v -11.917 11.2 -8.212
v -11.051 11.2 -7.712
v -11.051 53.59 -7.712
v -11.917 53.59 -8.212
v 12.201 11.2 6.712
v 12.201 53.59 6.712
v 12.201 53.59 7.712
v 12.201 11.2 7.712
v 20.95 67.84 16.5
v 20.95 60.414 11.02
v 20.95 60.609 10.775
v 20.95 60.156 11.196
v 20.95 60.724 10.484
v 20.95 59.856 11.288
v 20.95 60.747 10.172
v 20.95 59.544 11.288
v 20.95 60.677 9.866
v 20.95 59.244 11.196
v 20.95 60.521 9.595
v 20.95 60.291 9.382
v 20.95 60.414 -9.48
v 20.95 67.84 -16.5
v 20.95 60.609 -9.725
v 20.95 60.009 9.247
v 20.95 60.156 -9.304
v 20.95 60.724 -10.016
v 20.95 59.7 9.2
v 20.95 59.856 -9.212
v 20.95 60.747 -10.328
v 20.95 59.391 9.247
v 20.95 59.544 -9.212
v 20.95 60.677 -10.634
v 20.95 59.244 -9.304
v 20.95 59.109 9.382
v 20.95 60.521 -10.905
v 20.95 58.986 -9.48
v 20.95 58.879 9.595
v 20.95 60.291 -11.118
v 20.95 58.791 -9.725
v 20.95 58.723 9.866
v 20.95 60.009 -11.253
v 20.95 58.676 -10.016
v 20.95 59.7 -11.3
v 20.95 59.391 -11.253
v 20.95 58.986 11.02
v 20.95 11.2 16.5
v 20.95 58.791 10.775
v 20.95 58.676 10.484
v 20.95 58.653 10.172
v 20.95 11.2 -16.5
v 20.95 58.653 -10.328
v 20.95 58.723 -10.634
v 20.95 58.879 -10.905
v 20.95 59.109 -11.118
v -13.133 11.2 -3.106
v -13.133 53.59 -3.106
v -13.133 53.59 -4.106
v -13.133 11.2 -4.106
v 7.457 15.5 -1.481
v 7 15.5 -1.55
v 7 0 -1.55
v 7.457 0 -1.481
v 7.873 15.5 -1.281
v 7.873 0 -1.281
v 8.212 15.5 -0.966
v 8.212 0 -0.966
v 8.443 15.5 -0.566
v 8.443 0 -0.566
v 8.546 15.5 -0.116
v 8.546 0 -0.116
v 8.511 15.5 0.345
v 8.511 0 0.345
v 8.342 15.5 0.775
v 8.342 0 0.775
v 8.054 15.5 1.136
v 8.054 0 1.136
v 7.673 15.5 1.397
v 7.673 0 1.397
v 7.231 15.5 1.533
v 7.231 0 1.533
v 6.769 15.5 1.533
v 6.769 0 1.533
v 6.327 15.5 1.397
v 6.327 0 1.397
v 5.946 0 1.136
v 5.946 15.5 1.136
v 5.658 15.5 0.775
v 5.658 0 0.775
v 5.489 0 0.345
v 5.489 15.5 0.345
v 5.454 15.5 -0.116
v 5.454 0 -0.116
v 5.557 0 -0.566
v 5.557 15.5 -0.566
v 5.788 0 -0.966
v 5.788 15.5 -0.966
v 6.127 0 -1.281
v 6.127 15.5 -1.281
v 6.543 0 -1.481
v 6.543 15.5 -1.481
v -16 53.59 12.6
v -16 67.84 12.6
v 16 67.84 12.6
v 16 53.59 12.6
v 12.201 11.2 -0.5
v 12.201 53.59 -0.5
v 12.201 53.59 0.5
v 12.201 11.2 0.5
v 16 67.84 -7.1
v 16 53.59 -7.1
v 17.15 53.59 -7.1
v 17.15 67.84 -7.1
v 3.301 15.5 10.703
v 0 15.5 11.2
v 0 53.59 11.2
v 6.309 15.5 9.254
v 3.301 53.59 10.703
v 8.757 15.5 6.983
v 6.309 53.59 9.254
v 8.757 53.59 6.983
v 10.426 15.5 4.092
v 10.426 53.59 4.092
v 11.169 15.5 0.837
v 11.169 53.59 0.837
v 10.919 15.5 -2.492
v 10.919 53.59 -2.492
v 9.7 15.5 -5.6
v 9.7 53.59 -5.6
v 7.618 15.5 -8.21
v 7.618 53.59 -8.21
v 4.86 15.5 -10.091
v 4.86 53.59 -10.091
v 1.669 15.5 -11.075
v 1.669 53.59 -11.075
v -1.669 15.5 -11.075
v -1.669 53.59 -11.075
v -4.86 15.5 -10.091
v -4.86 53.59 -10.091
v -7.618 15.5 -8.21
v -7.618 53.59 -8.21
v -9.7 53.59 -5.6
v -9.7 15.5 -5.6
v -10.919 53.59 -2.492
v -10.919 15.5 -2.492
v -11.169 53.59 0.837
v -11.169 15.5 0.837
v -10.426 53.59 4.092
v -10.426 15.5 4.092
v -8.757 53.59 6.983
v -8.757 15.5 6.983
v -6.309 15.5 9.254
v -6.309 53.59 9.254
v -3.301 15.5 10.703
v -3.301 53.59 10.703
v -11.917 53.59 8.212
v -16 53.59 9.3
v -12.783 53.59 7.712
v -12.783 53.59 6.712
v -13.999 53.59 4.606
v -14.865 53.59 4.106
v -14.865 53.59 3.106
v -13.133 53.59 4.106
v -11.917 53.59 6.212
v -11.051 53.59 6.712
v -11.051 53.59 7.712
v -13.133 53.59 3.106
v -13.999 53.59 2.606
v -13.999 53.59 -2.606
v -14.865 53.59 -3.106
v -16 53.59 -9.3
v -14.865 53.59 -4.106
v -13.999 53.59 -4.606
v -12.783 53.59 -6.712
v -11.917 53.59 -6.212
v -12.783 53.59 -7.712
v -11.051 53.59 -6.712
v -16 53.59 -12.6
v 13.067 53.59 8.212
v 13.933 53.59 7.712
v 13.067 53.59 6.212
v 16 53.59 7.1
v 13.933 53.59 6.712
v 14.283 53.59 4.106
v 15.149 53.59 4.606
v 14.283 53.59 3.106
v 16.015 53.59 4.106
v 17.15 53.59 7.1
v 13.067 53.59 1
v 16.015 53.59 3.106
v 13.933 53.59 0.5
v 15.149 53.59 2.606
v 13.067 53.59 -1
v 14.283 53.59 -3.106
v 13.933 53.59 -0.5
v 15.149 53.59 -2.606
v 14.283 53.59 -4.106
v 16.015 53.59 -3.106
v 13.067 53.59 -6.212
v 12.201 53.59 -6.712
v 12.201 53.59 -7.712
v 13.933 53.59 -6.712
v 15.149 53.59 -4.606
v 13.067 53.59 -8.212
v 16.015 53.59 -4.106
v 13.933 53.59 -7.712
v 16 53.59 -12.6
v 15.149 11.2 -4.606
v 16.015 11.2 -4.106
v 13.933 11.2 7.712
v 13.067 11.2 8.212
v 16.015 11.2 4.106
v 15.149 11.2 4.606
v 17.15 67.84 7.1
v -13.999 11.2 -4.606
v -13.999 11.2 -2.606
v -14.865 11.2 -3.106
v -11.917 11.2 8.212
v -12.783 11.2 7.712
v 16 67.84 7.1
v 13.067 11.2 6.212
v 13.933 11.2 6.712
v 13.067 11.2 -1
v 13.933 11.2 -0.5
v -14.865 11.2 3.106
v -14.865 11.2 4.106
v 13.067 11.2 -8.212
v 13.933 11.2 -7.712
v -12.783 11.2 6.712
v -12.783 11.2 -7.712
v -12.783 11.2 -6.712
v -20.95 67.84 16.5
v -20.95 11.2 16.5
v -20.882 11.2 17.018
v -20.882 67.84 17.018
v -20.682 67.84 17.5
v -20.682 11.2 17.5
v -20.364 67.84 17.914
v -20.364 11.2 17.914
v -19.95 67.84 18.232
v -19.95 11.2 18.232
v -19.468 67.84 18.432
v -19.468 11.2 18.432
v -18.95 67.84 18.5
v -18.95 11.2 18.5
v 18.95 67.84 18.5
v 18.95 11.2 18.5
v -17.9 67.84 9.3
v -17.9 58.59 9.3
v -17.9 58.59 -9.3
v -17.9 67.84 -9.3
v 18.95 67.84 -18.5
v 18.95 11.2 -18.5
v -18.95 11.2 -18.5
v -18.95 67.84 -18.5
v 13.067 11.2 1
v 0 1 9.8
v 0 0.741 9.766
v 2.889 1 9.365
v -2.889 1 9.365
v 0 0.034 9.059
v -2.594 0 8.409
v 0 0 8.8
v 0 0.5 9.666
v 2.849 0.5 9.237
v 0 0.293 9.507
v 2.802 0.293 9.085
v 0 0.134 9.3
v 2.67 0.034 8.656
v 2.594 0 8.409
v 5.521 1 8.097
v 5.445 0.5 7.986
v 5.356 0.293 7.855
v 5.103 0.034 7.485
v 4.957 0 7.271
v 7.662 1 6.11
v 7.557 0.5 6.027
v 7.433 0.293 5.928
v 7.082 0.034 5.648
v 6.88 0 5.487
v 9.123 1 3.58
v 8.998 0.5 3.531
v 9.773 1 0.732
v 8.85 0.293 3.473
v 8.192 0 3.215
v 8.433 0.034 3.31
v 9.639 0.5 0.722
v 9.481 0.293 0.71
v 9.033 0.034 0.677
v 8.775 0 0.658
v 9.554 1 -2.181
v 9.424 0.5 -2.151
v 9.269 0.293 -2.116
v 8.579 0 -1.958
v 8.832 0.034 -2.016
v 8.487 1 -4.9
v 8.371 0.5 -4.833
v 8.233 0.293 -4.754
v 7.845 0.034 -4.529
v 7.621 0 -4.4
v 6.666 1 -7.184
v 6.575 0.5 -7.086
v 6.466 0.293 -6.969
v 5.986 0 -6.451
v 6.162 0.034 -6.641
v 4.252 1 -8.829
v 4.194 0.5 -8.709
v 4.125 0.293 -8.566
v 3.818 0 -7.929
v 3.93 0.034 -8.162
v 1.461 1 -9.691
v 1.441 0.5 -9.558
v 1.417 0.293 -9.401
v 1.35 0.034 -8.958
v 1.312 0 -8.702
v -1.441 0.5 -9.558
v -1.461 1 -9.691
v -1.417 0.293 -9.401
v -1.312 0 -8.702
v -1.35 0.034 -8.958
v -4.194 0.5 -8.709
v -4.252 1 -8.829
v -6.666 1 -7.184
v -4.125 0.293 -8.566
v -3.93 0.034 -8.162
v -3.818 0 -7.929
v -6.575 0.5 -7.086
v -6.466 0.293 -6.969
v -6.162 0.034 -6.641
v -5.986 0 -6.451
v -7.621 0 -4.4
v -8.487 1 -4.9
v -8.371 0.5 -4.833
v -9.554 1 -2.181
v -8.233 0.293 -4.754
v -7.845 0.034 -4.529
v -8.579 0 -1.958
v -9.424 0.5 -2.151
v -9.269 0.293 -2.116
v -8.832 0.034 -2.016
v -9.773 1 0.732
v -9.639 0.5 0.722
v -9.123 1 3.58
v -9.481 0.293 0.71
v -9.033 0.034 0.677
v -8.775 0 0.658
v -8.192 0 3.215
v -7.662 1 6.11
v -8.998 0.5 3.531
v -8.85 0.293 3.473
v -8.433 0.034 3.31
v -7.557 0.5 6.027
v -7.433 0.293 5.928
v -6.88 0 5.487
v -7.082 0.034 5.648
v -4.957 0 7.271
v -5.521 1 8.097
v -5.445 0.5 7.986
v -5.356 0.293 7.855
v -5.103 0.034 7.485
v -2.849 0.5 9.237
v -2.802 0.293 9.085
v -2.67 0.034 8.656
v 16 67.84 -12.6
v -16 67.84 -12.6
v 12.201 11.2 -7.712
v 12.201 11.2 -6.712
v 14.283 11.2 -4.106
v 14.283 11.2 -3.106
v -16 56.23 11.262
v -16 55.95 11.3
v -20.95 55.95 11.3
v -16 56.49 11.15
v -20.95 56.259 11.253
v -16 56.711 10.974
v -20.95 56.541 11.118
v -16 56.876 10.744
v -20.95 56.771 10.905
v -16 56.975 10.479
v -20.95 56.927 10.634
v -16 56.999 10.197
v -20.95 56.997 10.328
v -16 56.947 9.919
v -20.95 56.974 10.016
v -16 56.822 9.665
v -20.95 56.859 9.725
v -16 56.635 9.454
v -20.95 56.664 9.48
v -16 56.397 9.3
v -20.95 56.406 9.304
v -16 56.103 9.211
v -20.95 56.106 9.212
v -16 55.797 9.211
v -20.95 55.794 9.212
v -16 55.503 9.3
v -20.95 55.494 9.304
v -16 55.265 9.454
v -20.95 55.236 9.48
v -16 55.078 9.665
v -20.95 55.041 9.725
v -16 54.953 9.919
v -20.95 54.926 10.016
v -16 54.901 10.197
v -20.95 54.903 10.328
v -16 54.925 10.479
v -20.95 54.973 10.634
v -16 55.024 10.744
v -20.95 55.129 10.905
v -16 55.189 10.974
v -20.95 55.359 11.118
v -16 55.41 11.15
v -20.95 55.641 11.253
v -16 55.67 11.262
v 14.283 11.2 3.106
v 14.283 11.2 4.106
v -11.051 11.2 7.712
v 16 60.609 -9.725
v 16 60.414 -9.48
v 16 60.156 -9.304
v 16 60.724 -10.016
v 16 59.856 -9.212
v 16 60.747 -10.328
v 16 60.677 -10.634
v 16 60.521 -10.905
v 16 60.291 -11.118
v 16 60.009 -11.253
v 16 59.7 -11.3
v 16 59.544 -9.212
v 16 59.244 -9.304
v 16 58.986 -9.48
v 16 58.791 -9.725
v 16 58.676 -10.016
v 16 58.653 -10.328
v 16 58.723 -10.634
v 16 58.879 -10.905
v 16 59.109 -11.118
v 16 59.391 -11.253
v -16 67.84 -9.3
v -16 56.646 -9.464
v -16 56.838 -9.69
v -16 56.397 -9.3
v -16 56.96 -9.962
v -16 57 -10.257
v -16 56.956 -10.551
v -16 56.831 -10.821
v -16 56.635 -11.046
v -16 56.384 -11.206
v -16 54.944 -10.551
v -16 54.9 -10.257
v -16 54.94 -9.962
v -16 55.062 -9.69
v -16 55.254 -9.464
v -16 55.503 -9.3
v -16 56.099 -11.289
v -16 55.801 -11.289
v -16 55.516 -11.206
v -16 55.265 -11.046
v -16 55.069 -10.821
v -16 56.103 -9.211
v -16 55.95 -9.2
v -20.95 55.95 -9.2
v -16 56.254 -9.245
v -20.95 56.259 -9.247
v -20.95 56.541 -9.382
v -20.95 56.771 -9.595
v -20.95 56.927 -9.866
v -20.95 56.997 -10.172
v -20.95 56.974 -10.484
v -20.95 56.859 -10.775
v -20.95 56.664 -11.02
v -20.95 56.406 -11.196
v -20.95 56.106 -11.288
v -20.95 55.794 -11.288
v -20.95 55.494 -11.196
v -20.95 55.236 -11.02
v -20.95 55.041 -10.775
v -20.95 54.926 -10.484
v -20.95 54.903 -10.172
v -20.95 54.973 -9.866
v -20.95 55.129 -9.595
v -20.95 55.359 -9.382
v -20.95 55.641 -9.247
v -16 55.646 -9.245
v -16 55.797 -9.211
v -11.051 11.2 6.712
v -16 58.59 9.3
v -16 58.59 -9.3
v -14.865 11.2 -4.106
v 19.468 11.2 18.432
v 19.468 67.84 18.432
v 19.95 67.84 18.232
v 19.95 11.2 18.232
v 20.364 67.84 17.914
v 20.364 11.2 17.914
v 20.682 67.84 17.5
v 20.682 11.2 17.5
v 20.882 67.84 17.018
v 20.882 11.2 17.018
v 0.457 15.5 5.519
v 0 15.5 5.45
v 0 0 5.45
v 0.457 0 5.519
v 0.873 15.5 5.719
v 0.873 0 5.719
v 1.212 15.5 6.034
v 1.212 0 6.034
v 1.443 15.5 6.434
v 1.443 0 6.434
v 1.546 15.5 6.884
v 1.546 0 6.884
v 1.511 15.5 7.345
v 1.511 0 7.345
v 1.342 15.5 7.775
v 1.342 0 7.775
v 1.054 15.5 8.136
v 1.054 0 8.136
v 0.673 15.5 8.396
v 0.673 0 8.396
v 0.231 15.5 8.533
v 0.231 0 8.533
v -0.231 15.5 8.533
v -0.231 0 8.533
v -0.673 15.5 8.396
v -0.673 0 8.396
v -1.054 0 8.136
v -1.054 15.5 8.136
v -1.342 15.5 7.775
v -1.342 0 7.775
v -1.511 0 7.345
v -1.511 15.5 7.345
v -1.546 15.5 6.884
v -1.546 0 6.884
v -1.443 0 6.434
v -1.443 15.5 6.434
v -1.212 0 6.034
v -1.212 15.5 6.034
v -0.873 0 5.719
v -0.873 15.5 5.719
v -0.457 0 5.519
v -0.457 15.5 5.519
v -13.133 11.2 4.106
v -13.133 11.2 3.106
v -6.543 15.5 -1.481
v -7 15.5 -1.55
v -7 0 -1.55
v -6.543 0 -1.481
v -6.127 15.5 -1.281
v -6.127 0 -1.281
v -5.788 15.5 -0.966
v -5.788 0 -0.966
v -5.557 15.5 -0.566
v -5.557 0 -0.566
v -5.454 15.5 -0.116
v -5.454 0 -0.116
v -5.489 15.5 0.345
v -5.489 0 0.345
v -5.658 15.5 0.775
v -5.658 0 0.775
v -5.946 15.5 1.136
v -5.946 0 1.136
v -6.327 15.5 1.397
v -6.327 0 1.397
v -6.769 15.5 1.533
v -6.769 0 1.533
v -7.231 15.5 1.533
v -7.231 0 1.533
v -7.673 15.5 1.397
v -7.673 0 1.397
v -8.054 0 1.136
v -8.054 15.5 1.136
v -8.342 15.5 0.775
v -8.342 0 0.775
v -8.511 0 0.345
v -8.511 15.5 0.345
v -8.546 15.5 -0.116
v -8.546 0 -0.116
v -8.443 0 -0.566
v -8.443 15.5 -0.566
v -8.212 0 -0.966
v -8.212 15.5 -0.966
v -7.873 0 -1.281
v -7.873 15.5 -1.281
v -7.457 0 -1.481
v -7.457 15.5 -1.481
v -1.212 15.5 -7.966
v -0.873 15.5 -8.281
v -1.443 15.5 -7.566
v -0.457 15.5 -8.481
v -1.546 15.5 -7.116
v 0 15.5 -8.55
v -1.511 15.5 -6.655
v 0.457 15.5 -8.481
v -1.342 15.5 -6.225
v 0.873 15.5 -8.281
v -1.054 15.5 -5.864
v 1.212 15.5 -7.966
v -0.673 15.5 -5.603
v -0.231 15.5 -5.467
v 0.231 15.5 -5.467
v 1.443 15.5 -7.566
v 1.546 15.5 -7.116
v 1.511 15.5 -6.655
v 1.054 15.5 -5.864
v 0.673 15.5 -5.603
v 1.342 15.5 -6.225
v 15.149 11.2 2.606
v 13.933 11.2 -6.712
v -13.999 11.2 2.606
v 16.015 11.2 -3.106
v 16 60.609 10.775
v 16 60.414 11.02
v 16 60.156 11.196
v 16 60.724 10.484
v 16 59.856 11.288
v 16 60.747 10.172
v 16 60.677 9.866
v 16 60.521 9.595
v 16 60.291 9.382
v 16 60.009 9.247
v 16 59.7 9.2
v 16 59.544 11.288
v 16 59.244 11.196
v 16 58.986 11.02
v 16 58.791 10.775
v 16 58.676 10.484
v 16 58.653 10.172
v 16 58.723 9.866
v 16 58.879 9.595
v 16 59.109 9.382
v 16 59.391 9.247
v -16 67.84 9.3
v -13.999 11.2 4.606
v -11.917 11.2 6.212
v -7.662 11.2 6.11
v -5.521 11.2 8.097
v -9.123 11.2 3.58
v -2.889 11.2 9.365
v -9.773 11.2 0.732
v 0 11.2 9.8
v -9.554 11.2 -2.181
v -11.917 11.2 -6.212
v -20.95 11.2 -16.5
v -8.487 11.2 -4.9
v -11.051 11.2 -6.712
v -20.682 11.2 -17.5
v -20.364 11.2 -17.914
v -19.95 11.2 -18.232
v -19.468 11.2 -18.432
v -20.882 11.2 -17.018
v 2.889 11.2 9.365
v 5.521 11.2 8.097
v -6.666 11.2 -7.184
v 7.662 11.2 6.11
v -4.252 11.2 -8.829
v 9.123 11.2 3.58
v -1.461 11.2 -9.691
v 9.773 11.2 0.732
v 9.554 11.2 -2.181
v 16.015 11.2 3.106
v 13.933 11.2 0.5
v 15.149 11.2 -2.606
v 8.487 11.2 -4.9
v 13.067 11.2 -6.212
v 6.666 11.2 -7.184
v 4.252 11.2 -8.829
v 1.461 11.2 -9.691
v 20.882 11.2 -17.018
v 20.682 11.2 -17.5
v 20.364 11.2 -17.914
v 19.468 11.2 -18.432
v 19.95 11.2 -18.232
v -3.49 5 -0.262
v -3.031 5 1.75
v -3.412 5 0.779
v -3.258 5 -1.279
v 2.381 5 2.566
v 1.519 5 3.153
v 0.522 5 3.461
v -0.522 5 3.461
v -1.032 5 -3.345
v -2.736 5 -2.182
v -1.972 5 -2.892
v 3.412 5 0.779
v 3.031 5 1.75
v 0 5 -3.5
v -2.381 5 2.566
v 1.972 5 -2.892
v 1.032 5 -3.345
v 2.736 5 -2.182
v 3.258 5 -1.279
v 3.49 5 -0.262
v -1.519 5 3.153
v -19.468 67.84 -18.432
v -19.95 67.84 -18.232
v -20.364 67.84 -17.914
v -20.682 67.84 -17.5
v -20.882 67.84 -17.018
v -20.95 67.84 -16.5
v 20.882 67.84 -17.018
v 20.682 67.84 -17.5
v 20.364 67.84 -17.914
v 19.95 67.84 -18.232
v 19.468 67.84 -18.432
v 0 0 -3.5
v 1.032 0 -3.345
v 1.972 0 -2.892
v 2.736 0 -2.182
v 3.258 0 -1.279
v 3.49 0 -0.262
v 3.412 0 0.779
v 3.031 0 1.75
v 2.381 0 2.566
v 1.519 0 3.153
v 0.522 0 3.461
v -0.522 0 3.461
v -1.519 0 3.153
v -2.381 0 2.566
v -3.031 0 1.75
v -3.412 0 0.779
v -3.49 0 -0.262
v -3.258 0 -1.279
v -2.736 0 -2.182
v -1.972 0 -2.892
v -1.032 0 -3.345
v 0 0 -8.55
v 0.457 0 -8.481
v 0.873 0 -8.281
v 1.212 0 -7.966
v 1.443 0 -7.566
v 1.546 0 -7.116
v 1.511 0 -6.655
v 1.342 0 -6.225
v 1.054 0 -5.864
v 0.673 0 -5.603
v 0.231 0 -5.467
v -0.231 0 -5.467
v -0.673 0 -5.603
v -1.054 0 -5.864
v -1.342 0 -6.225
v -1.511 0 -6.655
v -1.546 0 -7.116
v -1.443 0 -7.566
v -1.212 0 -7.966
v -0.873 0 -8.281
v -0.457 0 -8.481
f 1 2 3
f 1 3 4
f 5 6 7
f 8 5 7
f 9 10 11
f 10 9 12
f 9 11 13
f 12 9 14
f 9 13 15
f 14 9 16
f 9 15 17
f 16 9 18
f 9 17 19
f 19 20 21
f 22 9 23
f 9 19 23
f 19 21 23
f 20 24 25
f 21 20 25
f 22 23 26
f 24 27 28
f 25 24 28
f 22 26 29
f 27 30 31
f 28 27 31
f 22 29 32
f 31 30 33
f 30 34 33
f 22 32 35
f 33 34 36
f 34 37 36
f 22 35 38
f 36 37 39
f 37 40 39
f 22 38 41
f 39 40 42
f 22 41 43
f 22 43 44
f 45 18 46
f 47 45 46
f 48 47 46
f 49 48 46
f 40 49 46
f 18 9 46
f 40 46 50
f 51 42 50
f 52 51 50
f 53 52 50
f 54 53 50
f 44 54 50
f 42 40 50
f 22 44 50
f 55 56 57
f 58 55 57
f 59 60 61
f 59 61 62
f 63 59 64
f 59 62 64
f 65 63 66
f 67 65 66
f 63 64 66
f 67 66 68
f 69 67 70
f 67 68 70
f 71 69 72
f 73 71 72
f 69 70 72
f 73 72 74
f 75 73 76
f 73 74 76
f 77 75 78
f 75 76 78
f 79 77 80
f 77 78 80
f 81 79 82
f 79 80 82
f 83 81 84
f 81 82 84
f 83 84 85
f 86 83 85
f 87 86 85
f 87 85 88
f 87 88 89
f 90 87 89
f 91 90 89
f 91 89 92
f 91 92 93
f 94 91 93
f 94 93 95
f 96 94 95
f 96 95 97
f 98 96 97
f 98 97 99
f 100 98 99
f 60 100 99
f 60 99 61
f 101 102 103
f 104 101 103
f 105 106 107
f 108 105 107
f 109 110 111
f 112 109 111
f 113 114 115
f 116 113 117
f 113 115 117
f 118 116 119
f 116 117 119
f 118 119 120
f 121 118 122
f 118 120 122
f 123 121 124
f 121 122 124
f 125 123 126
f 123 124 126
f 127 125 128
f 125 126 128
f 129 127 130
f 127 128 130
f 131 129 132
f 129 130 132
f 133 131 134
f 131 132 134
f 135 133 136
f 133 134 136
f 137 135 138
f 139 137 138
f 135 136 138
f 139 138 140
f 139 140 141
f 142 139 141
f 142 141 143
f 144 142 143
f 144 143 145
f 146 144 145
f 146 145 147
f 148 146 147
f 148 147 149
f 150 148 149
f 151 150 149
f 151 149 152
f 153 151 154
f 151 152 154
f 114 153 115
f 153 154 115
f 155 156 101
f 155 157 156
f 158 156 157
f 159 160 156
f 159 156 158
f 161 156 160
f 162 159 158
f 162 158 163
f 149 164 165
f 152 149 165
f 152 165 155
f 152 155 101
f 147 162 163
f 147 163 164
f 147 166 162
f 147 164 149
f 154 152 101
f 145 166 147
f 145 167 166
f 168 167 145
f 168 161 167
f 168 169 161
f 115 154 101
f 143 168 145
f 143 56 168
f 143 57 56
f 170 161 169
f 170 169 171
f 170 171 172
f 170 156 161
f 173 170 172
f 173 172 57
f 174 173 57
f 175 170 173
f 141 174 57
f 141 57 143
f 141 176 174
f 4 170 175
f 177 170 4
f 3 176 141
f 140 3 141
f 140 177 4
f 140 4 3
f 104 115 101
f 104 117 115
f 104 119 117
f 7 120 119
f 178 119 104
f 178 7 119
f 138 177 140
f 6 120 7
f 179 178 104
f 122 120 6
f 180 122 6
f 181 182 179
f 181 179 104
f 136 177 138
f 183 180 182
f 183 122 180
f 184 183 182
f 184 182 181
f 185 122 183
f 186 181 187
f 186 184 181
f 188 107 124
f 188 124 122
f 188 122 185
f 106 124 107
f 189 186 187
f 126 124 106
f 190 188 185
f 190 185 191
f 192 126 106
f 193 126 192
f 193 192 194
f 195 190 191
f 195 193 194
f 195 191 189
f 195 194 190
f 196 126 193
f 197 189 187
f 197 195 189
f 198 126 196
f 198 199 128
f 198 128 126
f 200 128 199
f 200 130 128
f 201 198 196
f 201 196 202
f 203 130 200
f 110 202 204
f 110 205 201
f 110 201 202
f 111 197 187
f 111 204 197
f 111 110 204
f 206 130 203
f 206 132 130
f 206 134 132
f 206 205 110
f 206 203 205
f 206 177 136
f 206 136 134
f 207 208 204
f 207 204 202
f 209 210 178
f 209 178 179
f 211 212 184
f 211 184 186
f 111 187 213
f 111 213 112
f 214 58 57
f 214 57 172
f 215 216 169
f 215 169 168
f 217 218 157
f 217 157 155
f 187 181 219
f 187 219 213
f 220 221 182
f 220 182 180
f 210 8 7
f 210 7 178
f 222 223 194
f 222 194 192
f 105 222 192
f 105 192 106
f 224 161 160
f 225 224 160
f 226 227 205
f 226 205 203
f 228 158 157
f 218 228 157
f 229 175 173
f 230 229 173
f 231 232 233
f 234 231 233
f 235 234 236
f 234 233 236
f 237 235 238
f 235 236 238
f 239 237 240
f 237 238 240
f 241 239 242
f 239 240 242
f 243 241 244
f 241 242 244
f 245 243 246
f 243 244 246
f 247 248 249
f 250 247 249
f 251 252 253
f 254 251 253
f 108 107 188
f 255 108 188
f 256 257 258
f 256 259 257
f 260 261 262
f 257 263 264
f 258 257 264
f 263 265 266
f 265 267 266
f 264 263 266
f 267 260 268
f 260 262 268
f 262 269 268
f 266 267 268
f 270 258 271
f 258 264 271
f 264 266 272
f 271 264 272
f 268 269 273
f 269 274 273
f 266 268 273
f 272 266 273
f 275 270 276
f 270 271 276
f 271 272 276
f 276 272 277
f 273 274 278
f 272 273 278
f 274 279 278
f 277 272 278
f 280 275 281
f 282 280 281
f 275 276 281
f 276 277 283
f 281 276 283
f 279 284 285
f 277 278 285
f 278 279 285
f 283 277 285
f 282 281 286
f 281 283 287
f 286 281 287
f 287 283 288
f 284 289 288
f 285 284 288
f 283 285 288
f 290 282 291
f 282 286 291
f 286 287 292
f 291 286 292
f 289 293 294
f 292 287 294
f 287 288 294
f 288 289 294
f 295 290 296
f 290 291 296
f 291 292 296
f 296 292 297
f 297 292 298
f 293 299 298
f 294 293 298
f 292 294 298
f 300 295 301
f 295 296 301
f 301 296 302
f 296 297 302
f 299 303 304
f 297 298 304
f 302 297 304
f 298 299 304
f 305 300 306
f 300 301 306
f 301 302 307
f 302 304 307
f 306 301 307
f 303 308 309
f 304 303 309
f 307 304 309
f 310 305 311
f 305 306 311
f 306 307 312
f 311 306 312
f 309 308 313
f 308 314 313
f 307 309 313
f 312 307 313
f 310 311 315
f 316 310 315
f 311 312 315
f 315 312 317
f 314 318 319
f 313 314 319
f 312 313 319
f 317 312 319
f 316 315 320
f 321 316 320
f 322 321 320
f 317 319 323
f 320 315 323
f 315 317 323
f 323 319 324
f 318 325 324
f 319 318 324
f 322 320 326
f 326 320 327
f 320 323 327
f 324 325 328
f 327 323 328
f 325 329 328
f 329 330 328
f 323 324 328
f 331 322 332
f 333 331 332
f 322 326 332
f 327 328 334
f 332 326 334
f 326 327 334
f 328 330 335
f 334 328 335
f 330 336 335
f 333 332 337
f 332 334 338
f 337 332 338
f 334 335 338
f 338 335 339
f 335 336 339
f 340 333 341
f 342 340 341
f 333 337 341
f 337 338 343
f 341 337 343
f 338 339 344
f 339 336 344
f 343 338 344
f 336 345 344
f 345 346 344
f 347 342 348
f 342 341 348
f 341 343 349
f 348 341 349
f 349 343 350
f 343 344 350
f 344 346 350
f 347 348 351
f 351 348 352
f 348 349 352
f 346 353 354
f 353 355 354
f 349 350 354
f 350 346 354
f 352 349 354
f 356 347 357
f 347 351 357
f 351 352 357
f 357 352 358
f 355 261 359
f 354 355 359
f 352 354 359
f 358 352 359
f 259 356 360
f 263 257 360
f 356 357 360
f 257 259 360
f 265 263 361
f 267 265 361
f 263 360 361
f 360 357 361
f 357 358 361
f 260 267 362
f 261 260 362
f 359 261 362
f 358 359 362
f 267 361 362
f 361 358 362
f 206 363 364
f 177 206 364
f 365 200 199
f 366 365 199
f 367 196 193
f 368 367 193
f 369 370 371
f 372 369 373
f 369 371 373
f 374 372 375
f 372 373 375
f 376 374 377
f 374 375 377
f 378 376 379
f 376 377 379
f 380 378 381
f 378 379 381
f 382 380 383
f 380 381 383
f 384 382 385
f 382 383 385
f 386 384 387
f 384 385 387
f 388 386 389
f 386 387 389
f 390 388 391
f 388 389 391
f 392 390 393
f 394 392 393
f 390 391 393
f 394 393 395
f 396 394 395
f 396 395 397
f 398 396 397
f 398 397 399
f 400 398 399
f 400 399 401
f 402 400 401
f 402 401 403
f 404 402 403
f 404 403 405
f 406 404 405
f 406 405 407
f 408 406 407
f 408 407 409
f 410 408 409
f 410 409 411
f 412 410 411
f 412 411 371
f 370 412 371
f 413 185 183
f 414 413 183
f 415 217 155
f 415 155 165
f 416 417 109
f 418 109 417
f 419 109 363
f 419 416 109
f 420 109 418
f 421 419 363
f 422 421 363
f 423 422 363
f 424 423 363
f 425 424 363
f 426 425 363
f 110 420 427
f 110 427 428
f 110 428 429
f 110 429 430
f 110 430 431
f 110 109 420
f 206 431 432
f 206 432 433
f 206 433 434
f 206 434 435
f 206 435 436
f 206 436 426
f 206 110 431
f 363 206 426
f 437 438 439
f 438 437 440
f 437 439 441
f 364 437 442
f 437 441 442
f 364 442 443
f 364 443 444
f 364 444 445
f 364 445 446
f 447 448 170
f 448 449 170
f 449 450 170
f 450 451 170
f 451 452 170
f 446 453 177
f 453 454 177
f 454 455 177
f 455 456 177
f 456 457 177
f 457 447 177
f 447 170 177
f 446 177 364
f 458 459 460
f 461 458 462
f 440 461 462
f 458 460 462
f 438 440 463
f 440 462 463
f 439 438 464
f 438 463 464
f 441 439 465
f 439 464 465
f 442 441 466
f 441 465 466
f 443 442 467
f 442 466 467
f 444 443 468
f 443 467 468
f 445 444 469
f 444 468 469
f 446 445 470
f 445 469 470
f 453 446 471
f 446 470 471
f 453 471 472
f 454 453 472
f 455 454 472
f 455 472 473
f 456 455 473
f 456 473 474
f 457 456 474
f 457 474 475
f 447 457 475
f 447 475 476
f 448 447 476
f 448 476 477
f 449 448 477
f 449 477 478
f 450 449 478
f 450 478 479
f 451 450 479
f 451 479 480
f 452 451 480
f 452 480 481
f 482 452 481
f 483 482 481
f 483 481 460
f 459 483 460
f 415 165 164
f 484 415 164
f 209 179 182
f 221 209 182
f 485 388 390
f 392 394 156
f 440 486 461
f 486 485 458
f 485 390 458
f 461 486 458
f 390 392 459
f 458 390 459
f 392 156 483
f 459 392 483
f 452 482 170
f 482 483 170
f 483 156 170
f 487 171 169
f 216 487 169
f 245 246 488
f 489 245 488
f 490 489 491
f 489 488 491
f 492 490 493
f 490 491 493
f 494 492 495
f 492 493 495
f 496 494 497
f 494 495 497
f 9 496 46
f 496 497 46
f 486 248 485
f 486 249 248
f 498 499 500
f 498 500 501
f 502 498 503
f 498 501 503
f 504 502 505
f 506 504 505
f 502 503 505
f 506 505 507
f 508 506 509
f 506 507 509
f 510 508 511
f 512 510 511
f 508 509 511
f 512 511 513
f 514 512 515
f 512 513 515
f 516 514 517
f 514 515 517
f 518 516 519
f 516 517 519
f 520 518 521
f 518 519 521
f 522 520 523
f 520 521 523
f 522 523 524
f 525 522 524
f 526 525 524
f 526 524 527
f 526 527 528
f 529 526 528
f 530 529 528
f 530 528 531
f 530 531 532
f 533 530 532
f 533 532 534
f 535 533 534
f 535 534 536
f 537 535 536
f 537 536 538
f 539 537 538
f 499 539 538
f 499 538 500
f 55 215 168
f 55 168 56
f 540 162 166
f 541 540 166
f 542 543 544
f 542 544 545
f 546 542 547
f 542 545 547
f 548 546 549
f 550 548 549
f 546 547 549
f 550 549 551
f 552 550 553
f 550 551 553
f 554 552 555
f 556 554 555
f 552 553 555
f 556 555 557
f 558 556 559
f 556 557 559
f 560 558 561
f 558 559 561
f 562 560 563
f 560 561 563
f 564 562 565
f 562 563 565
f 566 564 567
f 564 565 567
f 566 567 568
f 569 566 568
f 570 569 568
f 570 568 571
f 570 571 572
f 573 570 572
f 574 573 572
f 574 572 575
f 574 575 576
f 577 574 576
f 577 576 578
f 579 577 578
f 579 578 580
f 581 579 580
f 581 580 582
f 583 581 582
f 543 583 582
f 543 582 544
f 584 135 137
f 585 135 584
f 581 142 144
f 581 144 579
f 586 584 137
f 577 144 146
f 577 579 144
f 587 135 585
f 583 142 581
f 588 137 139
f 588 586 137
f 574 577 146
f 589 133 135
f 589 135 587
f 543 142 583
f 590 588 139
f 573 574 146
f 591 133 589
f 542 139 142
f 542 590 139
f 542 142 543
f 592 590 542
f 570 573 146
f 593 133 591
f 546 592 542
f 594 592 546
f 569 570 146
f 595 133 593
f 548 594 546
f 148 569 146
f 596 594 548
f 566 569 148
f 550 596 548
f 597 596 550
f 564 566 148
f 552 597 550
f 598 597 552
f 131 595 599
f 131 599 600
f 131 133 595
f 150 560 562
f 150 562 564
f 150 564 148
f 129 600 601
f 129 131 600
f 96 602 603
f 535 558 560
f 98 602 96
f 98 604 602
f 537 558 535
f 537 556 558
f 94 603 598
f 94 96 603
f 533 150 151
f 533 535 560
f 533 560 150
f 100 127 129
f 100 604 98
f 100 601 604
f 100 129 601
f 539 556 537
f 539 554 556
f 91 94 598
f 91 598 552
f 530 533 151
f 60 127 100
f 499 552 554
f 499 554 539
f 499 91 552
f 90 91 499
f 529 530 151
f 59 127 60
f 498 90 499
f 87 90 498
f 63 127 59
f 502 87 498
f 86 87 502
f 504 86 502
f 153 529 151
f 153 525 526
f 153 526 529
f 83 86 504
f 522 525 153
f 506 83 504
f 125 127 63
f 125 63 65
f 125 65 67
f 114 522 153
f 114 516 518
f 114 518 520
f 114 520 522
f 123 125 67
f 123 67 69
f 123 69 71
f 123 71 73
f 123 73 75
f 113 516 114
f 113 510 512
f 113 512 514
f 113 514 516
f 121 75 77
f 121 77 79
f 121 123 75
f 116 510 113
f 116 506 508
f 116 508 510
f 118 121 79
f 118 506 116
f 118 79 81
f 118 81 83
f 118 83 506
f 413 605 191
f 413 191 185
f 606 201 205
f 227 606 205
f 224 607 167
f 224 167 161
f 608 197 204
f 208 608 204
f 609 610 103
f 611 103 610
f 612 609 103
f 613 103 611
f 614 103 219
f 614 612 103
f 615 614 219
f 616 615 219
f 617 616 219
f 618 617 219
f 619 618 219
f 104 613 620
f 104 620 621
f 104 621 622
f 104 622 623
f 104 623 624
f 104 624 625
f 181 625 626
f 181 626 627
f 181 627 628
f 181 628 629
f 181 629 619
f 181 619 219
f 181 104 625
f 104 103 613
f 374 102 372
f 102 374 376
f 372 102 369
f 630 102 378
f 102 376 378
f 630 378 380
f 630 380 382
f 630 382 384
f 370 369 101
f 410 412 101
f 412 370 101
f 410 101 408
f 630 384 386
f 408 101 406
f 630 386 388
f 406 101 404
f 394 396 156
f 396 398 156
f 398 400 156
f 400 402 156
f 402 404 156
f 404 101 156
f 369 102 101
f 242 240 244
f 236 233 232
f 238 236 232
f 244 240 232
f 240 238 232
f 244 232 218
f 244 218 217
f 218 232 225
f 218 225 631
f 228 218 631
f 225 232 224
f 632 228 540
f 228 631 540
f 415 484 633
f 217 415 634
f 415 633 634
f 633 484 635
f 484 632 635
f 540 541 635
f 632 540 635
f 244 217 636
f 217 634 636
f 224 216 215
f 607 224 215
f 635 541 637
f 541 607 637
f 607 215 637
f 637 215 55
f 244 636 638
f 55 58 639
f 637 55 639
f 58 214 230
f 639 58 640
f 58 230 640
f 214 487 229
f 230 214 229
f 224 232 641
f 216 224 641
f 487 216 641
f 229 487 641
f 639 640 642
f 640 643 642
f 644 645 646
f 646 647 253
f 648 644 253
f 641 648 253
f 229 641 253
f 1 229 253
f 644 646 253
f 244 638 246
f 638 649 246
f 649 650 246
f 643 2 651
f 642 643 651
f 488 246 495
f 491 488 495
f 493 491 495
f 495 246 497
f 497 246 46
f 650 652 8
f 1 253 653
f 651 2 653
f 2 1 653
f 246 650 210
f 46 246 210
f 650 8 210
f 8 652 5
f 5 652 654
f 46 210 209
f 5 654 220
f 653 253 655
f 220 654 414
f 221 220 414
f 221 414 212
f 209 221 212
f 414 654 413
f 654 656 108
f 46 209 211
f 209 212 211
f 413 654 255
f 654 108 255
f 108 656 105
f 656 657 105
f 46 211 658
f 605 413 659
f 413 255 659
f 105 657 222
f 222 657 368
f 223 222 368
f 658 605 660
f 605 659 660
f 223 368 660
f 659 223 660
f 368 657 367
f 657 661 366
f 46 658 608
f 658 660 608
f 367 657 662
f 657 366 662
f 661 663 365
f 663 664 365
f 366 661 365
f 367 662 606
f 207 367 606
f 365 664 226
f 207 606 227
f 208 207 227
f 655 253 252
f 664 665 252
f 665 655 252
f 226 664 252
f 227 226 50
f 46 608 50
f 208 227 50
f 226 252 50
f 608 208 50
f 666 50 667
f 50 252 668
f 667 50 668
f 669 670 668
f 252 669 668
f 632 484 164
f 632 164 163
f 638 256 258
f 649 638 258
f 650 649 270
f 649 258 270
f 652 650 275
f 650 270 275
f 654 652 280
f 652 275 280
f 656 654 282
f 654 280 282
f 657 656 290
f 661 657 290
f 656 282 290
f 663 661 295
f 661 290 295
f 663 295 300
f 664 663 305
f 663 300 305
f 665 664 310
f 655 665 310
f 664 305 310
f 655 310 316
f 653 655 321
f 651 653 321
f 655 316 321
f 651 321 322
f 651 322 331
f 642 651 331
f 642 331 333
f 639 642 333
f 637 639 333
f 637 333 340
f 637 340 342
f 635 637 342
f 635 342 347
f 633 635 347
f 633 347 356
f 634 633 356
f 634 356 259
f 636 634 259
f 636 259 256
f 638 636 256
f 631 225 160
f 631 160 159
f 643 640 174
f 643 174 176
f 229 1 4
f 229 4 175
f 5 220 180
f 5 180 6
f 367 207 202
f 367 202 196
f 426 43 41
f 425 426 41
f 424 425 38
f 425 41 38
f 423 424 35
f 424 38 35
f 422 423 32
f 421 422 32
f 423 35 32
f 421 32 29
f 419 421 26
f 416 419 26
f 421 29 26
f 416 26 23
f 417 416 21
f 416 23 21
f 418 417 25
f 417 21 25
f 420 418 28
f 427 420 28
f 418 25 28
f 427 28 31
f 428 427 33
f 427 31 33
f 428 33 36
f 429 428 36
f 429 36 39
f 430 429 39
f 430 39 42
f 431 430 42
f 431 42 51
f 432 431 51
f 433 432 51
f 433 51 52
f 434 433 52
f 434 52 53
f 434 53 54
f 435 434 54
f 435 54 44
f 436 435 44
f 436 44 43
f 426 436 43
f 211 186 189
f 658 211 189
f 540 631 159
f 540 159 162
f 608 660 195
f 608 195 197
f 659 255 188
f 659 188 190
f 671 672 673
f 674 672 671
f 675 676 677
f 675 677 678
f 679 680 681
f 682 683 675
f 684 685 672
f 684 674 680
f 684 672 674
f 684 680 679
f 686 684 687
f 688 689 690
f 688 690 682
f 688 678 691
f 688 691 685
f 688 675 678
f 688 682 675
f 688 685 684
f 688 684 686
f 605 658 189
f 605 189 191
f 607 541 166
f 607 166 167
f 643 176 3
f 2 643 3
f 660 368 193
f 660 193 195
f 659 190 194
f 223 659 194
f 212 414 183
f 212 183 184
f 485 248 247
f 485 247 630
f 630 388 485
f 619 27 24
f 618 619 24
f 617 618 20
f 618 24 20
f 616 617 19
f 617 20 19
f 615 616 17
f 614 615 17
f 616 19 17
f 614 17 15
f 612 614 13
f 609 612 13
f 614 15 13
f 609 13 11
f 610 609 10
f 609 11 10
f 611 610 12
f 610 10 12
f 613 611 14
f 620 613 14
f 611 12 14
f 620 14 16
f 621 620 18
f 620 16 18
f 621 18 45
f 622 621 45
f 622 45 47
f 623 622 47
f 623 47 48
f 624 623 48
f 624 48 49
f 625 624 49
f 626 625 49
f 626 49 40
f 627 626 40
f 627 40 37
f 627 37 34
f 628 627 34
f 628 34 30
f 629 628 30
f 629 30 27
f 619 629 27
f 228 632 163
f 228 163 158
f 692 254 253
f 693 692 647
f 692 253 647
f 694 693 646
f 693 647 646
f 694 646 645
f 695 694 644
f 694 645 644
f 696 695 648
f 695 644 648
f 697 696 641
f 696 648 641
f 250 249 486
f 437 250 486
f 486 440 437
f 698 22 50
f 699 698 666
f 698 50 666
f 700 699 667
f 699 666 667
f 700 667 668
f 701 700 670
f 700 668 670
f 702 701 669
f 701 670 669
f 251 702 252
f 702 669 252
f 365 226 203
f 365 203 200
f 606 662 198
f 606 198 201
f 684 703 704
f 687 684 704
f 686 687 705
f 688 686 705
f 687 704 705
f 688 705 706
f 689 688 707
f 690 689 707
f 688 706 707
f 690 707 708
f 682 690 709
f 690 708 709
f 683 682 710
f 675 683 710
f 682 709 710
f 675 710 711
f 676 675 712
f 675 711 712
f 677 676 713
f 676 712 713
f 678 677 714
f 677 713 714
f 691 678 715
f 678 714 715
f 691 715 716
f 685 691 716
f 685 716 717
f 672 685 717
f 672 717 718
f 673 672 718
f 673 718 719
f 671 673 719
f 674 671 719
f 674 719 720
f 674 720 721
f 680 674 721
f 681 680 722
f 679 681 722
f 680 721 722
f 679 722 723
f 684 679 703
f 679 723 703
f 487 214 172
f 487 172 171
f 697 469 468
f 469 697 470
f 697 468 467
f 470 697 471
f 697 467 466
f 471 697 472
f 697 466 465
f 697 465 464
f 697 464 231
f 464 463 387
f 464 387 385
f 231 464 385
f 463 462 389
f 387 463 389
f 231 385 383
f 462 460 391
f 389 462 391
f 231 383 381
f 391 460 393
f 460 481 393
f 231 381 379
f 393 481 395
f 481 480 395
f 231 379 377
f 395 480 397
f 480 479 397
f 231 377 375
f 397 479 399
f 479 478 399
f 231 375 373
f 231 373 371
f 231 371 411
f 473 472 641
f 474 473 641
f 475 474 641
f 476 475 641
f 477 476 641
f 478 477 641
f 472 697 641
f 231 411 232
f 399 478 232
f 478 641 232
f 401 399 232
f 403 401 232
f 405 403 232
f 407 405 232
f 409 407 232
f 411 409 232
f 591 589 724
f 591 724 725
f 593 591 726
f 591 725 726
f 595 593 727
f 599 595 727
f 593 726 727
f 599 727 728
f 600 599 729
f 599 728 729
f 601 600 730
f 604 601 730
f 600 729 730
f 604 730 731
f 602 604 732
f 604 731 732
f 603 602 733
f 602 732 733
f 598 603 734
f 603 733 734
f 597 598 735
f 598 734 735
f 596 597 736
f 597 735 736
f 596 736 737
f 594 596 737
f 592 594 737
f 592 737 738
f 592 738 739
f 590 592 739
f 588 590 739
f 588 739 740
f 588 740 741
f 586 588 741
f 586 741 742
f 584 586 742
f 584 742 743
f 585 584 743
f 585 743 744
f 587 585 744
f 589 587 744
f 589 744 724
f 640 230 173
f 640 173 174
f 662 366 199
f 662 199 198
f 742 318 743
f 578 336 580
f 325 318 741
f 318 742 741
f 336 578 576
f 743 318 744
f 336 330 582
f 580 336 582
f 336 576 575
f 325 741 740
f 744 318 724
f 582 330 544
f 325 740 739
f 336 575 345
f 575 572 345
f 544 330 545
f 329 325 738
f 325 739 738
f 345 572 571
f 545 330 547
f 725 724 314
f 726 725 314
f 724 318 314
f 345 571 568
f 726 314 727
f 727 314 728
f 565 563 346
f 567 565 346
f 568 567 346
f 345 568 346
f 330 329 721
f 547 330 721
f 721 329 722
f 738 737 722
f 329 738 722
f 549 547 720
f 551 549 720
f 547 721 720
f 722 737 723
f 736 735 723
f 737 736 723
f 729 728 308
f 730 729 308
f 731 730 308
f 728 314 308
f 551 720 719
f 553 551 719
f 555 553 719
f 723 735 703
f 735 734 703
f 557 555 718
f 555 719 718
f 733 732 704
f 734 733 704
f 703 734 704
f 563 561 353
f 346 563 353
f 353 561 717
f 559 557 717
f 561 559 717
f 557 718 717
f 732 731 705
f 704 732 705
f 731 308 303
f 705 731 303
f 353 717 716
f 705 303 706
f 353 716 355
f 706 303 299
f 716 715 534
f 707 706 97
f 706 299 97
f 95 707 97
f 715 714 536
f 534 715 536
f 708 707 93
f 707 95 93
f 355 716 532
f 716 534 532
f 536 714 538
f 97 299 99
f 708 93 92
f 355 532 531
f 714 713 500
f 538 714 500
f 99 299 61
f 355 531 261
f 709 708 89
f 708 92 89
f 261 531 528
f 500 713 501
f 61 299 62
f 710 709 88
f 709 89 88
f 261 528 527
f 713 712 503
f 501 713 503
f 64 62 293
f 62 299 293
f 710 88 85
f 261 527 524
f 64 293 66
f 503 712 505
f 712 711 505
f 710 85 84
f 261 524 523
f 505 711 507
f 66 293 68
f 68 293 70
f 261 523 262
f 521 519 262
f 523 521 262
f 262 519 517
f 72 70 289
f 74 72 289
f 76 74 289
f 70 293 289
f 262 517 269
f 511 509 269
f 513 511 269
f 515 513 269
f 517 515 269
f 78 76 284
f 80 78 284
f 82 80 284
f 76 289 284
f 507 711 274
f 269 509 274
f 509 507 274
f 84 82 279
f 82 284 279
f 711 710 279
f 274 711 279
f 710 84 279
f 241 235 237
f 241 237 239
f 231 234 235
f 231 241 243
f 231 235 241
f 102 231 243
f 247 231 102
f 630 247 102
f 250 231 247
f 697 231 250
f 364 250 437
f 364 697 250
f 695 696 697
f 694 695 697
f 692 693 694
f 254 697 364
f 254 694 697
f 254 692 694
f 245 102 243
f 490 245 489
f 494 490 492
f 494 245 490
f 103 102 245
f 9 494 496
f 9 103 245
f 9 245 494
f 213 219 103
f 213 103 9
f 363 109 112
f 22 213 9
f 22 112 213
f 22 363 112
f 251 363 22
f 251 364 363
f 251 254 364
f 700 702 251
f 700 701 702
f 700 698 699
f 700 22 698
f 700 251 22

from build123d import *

# Parameters (mm, degrees)
SKETCH1_R                 = 9.8
BOSS_EXTRUDE1_DEPTH       = 15.7
FILLET1_R                 = 1
SKETCH3_W                 = 41.9
SKETCH3_H                 = 37
BOSS_EXTRUDE2_DEPTH       = 37.89
SKETCH2_R                 = 1.55
CUT_EXTRUDE1_DEPTH        = 61.440388814
SKETCH4_W                 = 4.95
SKETCH4_H                 = 37
BOSS_EXTRUDE3_DEPTH       = 14.25
CUT_EXTRUDE_START         = -14.25
CUT_EXTRUDE_2_OUTLINE_W   = 1.15
CUT_EXTRUDE_2_OUTLINE_H   = 14.2
CUT_EXTRUDE_2_OUTLINE_W_2 = 1.900000227
CUT_EXTRUDE_2_OUTLINE_H_2 = 18.6
CUT_EXTRUDE_2_DEPTH       = 14.25
CUT_EXTRUDE_1_REACH       = 83.854
SKETCH_1_R                = 1.05
CUT_EXTRUDE3_START        = -5
SKETCH6_R                 = 1.41
CUT_EXTRUDE3_DEPTH        = 69.371779997
FILLET5_R                 = 2
MOVE_START                = 11.2
MOVE_FACE_1_OUTLINE_R     = 9.8
MOVE_FACE_1_DEPTH         = 4.5
SKETCH_4_R                = 11.200313663
CUT_EXTRUDE_3_DEPTH       = 38.09
SKETCH_6_W                = 2.268388773
SKETCH_6_H                = 19.352707125
EXTRUDE_1_DEPTH           = 5
CUT_EXTRUDE2_REACH        = 83.854
SKETCH5_R                 = 1.05
SKETCH_7_W                = 33.485055755
SKETCH_7_H                = 15.84059592
EXTRUDE_2_DEPTH           = 5.9
SKETCH_8_W                = 34.098293505
SKETCH_8_H                = 15.557673108
EXTRUDE_3_DEPTH           = 5.9
OTHER_START               = 11.2
OTHER_1_DEPTH             = 42.39
SKETCH_9_R                = 3.5
CUT_EXTRUDE_4_DEPTH       = 5


# Read off the part's stored shape, not the designer's step: 切除-拉伸2, 移动面1, 填充阵列1
with BuildPart() as part:
    # Sketch1 → Boss-Extrude1 (new body)
    with BuildSketch(Plane(origin=(0, 0, 0), x_dir=(1, 0, 0), z_dir=(0, 1, 0))):
        with Locations(Location((0, 0, 0), (0, 0, 270))):
            Circle(SKETCH1_R)
    extrude(amount=BOSS_EXTRUDE1_DEPTH)

    # Fillet1
    fillet1_edges = [part.edges().sort_by_distance(p)[0] for p in [
        (0, 0, -9.8),
    ]]
    fillet(fillet1_edges, radius=FILLET1_R)

    # Sketch3 → Boss-Extrude2 (add)
    with BuildSketch(Plane(origin=(0, 15.7, 0), x_dir=(1, 0, 0), z_dir=(0, 1, 0))):
        Rectangle(SKETCH3_W, SKETCH3_H)
    extrude(amount=BOSS_EXTRUDE2_DEPTH)

    # Sketch2 → Cut-Extrude1 (cut, through all)
    with BuildSketch(Plane(origin=(0, 0, 0), x_dir=(-1, 0, 0), z_dir=(0, -1, 0))):
        with Locations(Location((0, 6.999998127, 0), (0, 0, 90))):
            Circle(SKETCH2_R)
        with Locations(Location((6.999998127, 0, 0), (0, 0, 90))):
            Circle(SKETCH2_R)
        with Locations(Location((0, -6.999998127, 0), (0, 0, 90))):
            Circle(SKETCH2_R)
        with Locations(Location((-6.999998127, 0, 0), (0, 0, 90))):
            Circle(SKETCH2_R)
    extrude(amount=-CUT_EXTRUDE1_DEPTH, mode=Mode.SUBTRACT)

    # Sketch4 → Boss-Extrude3 (add)
    with BuildSketch(Plane(origin=(0, 53.59, 0), x_dir=(1, 0, 0), z_dir=(0, 1, 0))):
        with Locations((-18.475, 0)):
            Rectangle(SKETCH4_W, SKETCH4_H)
        with Locations((18.475, 0)):
            Rectangle(SKETCH4_W, SKETCH4_H)
    extrude(amount=BOSS_EXTRUDE3_DEPTH)

    # 切除-拉伸2 outline → 切除-拉伸2 (cut)
    with BuildSketch(Plane(origin=(0, 67.84, 0), x_dir=(1, 0, 0), z_dir=(0, 1, 0)).offset(CUT_EXTRUDE_START)):
        with Locations((16.575, 0)):
            Rectangle(CUT_EXTRUDE_2_OUTLINE_W, CUT_EXTRUDE_2_OUTLINE_H)
        with Locations((-16.950000113, 0)):
            Rectangle(CUT_EXTRUDE_2_OUTLINE_W_2, CUT_EXTRUDE_2_OUTLINE_H_2)
    extrude(amount=CUT_EXTRUDE_2_DEPTH, mode=Mode.SUBTRACT)

    # 草图1 → 切除-拉伸1 (cut, up to next)
    with BuildSketch(Plane(origin=(20.95, 0, 0), x_dir=(0, 0, -1), z_dir=(1, 0, 0)), mode=Mode.PRIVATE) as cut_extrude_1_sk1:
        with Locations((-10.25, 59.7)):
            Circle(SKETCH_1_R)
    cut_extrude_1_tool1 = extrude(cut_extrude_1_sk1.sketch, amount=-CUT_EXTRUDE_1_REACH, mode=Mode.PRIVATE) & part.part
    # 草图1 → 切除-拉伸1 (cut, up to next)
    with BuildSketch(Plane(origin=(20.95, 0, 0), x_dir=(0, 0, -1), z_dir=(1, 0, 0)), mode=Mode.PRIVATE) as cut_extrude_1_sk2:
        with Locations((10.25, 59.7)):
            Circle(SKETCH_1_R)
    cut_extrude_1_tool2 = extrude(cut_extrude_1_sk2.sketch, amount=-CUT_EXTRUDE_1_REACH, mode=Mode.PRIVATE) & part.part
    add(cut_extrude_1_tool1.solids().sort_by_distance((20.95, 59.7, 10.25))[0], mode=Mode.SUBTRACT)
    add(cut_extrude_1_tool2.solids().sort_by_distance((20.95, 59.7, -10.25))[0], mode=Mode.SUBTRACT)

    # Sketch6 → Cut-Extrude3 (cut, through all)
    with BuildSketch(Plane.XZ.offset(CUT_EXTRUDE3_START)):
        with Locations((0, 6.999998127)):
            Circle(SKETCH6_R)
        with Locations((0, -6.999998127)):
            Circle(SKETCH6_R)
        with Locations((-6.999998127, 0)):
            Circle(SKETCH6_R)
        with Locations((6.999998127, 0)):
            Circle(SKETCH6_R)
    extrude(amount=-CUT_EXTRUDE3_DEPTH, mode=Mode.SUBTRACT)

    # Fillet5
    fillet5_edges = [part.edges().sort_by_distance(p)[0] for p in [
        (20.95, 41.77, -18.5),
        (-20.95, 41.77, -18.5),
        (-20.95, 41.77, 18.5),
        (20.95, 41.77, 18.5),
    ]]
    fillet(fillet5_edges, radius=FILLET5_R)

    # Move Face 1 outline → Move Face 1 (add)
    with BuildSketch(Plane(origin=(0, 0, 0), x_dir=(1, 0, 0), z_dir=(0, 1, 0)).offset(MOVE_START)):
        with BuildLine():
            Line((20.95, -16.5), (20.95, 16.5))
            ThreePointArc((20.95, 16.5), (20.364213562, 17.914213562), (18.95, 18.5))
            Line((18.95, 18.5), (-18.95, 18.5))
            ThreePointArc((-18.95, 18.5), (-20.364213562, 17.914213562), (-20.95, 16.5))
            Line((-20.95, 16.5), (-20.95, -16.5))
            ThreePointArc((-20.95, -16.5), (-20.364213562, -17.914213562), (-18.95, -18.5))
            Line((-18.95, -18.5), (18.95, -18.5))
            ThreePointArc((18.95, -18.5), (20.364213562, -17.914213562), (20.95, -16.5))
        make_face()
        Circle(MOVE_FACE_1_OUTLINE_R, mode=Mode.SUBTRACT)
    extrude(amount=MOVE_FACE_1_DEPTH)

    # 草图4 → 切除-拉伸3 (cut)
    with BuildSketch(Plane(origin=(0, 53.59, 0), x_dir=(1, 0, 0), z_dir=(0, 1, 0))):
        with Locations(Location((0, 0, 0), (0, 0, 270))):
            Circle(SKETCH_4_R)
    extrude(amount=-CUT_EXTRUDE_3_DEPTH, mode=Mode.SUBTRACT)

    # 草图6 → 凸台-拉伸1 (add)
    with BuildSketch(Plane(origin=(0, 53.59, 0), x_dir=(1, 0, 0), z_dir=(0, 1, 0))):
        with Locations((-17.13419541, 0.070716348)):
            Rectangle(SKETCH_6_W, SKETCH_6_H)
    extrude(amount=EXTRUDE_1_DEPTH)

    # Sketch5 → Cut-Extrude2 (cut, up to next)
    with BuildSketch(Plane.ZY.offset(20.95), mode=Mode.PRIVATE) as cut_extrude2_sk1:
        with Locations((-10.25, 55.95)):
            Circle(SKETCH5_R)
    cut_extrude2_tool1 = extrude(cut_extrude2_sk1.sketch, amount=-CUT_EXTRUDE2_REACH, mode=Mode.PRIVATE) & part.part
    # Sketch5 → Cut-Extrude2 (cut, up to next)
    with BuildSketch(Plane.ZY.offset(20.95), mode=Mode.PRIVATE) as cut_extrude2_sk2:
        with Locations((10.25, 55.95)):
            Circle(SKETCH5_R)
    cut_extrude2_tool2 = extrude(cut_extrude2_sk2.sketch, amount=-CUT_EXTRUDE2_REACH, mode=Mode.PRIVATE) & part.part
    add(cut_extrude2_tool1.solids().sort_by_distance((-20.95, 55.95, -10.25))[0], mode=Mode.SUBTRACT)
    add(cut_extrude2_tool2.solids().sort_by_distance((-20.95, 55.95, 10.25))[0], mode=Mode.SUBTRACT)

    # 草图7 → 凸台-拉伸2 (add)
    with BuildSketch(Plane.XY.offset(18.5)):
        with Locations((0.159698038, 59.91970204)):
            Rectangle(SKETCH_7_W, SKETCH_7_H)
    extrude(amount=-EXTRUDE_2_DEPTH)

    # 草图8 → 凸台-拉伸3 (add)
    with BuildSketch(Plane(origin=(0, 0, -18.5), x_dir=(-1, 0, 0), z_dir=(0, 0, -1))):
        with Locations((-0.100853247, 60.061163446)):
            Rectangle(SKETCH_8_W, SKETCH_8_H)
    extrude(amount=-EXTRUDE_3_DEPTH)

    # Other 1 outline → Other 1 (cut)
    with BuildSketch(Plane(origin=(0, 0, 0), x_dir=(1, 0, 0), z_dir=(0, 1, 0)).offset(OTHER_START)):
        Polygon((15.149306373, -4.606205589), (16.015331777, -4.106205589), (16.015331777, -3.106205589), (15.149306373, -2.606205589), (14.283280969, -3.106205589), (14.283280969, -4.106205589), align=None)
        Polygon((16.015331777, 3.106205589), (16.015331777, 4.106205589), (15.149306373, 4.606205589), (14.283280969, 4.106205589), (14.283280969, 3.106205589), (15.149306373, 2.606205589), align=None)
        Polygon((-11.917262605, 6.212411178), (-11.051237202, 6.712411178), (-11.051237202, 7.712411178), (-11.917262605, 8.212411178), (-12.783288009, 7.712411178), (-12.783288009, 6.712411178), align=None)
        Polygon((-11.051237202, -7.712411178), (-11.051237202, -6.712411178), (-11.917262605, -6.212411178), (-12.783288009, -6.712411178), (-12.783288009, -7.712411178), (-11.917262605, -8.212411178), align=None)
        Polygon((13.933288009, -6.712411178), (13.067262605, -6.212411178), (12.201237202, -6.712411178), (12.201237202, -7.712411178), (13.067262605, -8.212411178), (13.933288009, -7.712411178), align=None)
        Polygon((13.933288009, -0.5), (13.933288009, 0.5), (13.067262605, 1), (12.201237202, 0.5), (12.201237202, -0.5), (13.067262605, -1), align=None)
        Polygon((13.933288009, 6.712411178), (13.933288009, 7.712411178), (13.067262605, 8.212411178), (12.201237202, 7.712411178), (12.201237202, 6.712411178), (13.067262605, 6.212411178), align=None)
        Polygon((-13.999306373, 2.606205589), (-13.133280969, 3.106205589), (-13.133280969, 4.106205589), (-13.999306373, 4.606205589), (-14.865331777, 4.106205589), (-14.865331777, 3.106205589), align=None)
        Polygon((-13.133280969, -4.106205589), (-13.133280969, -3.106205589), (-13.999306373, -2.606205589), (-14.865331777, -3.106205589), (-14.865331777, -4.106205589), (-13.999306373, -4.606205589), align=None)
    extrude(amount=OTHER_1_DEPTH, mode=Mode.SUBTRACT)

    # 草图9 → 切除-拉伸4 (cut)
    with BuildSketch(Plane.XZ):
        with Locations(Location((0, 0, 0), (0, 0, 270))):
            Circle(SKETCH_9_R)
    extrude(amount=-CUT_EXTRUDE_4_DEPTH, mode=Mode.SUBTRACT)


solid = part.part
